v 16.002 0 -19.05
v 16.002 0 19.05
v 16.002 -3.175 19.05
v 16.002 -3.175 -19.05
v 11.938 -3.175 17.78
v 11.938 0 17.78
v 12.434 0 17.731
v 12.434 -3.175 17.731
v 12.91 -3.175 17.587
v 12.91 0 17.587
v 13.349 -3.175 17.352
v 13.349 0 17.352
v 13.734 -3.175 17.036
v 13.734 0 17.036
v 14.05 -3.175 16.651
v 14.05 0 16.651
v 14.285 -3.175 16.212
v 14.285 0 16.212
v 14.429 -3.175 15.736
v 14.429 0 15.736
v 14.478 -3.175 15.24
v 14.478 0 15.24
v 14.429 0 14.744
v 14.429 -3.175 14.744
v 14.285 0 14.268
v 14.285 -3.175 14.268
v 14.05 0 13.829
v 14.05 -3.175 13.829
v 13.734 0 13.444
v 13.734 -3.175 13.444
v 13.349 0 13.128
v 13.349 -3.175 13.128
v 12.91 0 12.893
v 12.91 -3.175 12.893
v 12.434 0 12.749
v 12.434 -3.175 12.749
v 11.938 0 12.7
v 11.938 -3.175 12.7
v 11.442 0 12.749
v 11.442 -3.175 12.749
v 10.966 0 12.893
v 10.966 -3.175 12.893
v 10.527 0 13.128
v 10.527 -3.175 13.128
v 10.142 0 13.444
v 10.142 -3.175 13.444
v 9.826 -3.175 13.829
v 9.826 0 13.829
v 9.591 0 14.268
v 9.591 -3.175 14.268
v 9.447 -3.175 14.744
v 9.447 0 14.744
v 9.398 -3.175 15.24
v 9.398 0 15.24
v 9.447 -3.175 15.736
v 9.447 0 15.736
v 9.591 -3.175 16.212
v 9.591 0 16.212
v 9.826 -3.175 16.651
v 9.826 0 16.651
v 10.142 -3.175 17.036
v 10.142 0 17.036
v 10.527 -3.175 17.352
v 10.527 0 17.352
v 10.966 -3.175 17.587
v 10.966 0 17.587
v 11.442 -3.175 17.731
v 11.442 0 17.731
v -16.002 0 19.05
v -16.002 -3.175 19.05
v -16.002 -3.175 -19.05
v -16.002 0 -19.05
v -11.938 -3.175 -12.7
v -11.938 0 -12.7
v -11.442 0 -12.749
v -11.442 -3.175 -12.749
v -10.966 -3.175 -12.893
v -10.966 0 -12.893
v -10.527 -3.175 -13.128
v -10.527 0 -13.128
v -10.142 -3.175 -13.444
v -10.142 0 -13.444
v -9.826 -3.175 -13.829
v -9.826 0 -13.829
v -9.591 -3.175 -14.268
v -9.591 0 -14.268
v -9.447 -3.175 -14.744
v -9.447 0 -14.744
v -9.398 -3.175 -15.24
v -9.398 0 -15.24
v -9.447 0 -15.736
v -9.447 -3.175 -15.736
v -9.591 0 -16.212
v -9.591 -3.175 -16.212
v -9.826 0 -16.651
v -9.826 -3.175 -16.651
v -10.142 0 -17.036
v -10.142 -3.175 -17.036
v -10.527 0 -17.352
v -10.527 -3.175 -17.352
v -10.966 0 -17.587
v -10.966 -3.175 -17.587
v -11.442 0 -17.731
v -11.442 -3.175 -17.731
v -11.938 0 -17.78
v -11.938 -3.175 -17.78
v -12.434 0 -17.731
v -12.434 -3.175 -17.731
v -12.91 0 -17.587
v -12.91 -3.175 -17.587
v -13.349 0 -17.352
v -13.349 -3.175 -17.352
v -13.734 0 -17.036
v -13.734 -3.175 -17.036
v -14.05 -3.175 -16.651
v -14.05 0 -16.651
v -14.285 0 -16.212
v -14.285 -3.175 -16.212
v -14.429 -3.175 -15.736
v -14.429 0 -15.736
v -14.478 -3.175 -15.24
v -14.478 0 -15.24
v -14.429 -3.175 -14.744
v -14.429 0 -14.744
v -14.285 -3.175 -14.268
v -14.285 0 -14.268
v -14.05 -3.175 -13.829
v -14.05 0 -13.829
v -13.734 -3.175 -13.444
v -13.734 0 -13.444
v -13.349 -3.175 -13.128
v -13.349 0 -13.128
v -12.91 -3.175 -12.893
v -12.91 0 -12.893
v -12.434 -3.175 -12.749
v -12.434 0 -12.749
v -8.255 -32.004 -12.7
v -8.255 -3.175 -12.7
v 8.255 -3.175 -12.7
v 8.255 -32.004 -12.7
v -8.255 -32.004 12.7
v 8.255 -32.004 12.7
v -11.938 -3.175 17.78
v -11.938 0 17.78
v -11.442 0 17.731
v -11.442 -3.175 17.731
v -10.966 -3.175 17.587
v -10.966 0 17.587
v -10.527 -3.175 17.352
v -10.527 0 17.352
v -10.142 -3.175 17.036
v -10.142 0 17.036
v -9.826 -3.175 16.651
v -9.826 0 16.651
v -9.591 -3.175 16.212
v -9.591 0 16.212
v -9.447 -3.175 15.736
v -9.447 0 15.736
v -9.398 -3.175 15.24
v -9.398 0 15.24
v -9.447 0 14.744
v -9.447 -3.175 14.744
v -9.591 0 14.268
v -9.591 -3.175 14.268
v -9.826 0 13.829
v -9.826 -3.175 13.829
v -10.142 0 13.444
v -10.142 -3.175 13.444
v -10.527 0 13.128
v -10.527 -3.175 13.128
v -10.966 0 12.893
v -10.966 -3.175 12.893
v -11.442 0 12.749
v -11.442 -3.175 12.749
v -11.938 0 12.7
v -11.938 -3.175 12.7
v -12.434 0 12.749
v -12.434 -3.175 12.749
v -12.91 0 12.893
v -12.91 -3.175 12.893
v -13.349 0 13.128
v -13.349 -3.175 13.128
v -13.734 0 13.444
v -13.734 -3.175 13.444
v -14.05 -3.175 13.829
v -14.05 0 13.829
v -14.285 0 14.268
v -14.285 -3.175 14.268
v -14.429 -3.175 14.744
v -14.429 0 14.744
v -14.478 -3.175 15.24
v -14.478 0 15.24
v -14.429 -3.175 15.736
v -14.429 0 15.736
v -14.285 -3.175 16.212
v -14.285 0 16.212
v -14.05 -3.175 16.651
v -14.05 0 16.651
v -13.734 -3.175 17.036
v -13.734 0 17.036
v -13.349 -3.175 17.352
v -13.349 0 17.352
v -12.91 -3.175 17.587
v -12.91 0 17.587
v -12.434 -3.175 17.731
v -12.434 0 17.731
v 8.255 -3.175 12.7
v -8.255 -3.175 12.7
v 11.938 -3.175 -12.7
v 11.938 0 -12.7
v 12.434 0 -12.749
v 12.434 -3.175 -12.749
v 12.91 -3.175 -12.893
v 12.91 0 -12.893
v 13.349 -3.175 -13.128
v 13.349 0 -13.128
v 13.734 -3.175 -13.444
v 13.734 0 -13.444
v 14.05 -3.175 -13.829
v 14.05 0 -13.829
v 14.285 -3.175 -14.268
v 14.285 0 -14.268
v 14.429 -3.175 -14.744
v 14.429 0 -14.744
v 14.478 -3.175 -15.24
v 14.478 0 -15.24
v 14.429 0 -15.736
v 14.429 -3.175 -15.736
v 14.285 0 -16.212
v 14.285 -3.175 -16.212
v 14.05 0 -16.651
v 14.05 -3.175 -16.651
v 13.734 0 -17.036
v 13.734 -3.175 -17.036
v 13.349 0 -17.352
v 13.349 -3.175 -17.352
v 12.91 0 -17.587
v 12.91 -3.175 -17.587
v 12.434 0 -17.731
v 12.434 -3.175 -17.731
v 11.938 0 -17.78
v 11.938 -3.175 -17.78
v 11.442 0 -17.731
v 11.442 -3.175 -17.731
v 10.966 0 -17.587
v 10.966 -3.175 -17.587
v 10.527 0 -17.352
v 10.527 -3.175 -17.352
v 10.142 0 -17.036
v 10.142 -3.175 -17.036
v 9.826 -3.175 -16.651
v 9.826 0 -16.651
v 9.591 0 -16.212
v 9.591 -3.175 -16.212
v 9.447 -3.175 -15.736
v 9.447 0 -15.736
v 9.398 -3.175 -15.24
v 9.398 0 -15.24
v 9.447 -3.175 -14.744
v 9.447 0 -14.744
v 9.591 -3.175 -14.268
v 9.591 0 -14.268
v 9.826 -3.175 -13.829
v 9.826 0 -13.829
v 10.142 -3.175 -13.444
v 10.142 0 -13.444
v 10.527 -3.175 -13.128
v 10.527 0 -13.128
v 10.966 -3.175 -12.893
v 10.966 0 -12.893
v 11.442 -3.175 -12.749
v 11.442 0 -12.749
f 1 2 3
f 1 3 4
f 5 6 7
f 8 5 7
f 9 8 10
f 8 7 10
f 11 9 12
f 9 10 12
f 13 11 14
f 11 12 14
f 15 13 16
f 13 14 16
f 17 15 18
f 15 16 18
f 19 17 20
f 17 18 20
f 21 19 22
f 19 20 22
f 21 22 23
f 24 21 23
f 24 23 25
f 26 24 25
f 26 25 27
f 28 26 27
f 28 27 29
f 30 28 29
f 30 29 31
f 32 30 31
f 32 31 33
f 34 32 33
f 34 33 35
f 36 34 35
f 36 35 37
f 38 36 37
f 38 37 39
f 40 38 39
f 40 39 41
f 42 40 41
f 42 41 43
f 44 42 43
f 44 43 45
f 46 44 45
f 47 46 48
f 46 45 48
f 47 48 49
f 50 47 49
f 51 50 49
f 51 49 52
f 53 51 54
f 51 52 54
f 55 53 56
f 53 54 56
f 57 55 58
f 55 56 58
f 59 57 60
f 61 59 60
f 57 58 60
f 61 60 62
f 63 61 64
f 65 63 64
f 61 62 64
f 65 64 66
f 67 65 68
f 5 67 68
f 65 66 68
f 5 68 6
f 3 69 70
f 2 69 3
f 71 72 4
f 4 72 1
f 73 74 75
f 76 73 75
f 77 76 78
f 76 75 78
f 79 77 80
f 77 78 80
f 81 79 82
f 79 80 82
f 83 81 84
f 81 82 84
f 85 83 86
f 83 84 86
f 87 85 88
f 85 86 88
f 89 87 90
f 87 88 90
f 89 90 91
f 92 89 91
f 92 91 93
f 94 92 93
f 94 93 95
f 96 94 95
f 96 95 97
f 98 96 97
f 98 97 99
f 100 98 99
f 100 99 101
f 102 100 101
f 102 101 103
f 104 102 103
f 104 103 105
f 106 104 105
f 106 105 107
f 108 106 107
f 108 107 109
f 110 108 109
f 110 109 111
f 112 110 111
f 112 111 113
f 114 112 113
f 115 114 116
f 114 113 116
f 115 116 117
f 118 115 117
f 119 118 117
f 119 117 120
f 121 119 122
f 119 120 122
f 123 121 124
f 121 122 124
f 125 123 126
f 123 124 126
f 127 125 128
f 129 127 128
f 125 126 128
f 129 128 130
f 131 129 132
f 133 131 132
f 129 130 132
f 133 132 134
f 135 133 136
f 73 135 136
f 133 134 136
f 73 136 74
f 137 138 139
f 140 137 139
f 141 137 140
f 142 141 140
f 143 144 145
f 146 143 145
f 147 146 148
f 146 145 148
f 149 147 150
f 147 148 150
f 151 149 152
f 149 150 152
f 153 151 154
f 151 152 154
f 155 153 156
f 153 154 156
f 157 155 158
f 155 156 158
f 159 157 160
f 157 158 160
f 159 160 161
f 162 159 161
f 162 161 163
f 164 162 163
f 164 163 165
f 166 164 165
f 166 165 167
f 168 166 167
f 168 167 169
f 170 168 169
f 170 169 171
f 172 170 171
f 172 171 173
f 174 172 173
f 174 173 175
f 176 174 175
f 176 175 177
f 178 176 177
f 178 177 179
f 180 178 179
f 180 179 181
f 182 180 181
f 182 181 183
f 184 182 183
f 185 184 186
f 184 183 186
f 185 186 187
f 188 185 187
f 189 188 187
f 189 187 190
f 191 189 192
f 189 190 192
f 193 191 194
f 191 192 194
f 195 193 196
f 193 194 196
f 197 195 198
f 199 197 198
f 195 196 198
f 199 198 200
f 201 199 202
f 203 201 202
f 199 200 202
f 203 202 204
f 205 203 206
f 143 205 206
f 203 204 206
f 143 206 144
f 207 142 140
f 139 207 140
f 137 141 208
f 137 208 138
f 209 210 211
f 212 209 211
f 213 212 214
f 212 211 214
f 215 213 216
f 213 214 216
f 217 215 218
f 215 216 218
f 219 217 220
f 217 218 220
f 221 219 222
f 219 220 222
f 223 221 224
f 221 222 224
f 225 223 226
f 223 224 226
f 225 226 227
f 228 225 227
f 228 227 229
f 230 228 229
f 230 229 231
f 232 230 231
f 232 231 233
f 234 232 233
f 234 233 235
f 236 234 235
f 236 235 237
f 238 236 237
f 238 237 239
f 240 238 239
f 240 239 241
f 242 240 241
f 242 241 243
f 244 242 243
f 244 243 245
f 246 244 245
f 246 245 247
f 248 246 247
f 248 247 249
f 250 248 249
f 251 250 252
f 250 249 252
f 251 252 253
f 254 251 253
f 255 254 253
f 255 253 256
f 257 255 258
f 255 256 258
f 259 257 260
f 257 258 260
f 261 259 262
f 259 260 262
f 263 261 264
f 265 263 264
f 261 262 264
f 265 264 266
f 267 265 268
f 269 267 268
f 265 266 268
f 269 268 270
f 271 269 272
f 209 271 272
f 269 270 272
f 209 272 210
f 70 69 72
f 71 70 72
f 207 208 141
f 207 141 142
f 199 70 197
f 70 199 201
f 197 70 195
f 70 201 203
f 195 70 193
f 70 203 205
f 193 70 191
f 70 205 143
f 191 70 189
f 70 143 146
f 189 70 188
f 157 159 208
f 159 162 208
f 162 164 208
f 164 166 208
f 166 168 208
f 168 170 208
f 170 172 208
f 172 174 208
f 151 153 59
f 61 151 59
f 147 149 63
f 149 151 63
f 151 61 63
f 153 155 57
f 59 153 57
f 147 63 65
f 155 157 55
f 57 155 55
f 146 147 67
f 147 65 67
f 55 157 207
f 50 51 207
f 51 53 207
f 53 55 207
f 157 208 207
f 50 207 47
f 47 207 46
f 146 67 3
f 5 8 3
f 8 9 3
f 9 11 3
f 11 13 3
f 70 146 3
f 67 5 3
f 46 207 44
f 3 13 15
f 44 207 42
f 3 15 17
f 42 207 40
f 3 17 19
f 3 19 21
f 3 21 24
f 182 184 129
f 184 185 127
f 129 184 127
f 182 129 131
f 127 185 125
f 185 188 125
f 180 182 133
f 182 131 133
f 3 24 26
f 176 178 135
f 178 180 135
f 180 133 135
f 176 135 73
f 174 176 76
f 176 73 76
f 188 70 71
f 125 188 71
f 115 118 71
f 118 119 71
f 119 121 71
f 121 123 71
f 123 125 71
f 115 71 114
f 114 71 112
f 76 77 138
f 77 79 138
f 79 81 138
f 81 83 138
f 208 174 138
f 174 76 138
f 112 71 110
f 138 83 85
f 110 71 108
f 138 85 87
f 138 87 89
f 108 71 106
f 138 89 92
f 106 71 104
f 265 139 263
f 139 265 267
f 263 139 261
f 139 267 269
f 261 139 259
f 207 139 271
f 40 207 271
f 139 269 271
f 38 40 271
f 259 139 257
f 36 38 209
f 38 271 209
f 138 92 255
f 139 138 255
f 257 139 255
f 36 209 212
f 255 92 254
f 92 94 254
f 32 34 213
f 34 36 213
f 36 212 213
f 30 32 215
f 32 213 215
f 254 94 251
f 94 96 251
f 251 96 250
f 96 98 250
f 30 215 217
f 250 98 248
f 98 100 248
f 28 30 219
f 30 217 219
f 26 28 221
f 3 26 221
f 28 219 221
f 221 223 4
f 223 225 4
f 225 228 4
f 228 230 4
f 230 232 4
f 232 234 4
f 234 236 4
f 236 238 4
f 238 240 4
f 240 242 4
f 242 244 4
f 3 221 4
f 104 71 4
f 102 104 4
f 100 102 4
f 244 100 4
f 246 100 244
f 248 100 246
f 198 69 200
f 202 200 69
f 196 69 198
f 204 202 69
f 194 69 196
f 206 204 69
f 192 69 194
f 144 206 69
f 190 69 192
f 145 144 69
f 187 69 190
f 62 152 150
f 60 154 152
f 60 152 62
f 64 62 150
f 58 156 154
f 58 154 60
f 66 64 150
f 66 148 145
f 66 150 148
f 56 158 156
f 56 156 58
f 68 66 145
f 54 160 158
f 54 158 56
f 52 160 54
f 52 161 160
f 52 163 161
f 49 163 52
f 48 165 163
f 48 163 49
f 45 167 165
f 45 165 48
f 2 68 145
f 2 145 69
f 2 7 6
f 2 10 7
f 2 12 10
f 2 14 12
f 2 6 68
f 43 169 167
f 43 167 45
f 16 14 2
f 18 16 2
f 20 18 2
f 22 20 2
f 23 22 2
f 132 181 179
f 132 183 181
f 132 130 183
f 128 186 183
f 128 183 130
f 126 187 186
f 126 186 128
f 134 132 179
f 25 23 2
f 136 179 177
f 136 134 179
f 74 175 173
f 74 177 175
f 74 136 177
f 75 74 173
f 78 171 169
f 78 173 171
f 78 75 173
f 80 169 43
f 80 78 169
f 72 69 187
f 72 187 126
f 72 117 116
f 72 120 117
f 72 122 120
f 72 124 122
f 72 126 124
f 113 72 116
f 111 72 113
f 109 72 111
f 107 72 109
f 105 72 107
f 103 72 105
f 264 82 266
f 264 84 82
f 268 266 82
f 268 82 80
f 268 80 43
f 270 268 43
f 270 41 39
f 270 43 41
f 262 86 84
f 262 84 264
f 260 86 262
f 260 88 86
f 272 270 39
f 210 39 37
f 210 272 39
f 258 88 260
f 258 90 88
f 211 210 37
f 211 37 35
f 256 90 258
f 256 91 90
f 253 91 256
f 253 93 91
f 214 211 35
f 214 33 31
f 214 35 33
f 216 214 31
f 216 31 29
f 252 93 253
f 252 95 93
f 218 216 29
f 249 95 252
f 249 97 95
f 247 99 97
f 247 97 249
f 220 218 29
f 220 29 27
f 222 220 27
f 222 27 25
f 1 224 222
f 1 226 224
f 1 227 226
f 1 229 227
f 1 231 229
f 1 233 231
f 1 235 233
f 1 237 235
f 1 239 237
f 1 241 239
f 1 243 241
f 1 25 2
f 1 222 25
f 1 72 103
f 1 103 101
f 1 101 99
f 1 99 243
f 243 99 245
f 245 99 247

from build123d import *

# Parameters (mm, degrees)
SKETCH3_W           = 32.004
SKETCH3_H           = 38.1
BOSS_EXTRUDE1_DEPTH = 3.175
SKETCH4_R           = 2.54
SCREW_HOLES_DEPTH   = 26.080811969
SKETCH5_W           = 16.51
SKETCH5_H           = 25.4
WHEEL_APPROX_DEPTH  = 32.004


with BuildPart() as part:
    # Sketch3 → Boss-Extrude1 (new body)
    with BuildSketch(Plane(origin=(0, 0, 0), x_dir=(1, 0, 0), z_dir=(0, 1, 0))):
        Rectangle(SKETCH3_W, SKETCH3_H)
    extrude(amount=-BOSS_EXTRUDE1_DEPTH)

    # Sketch4 → Screw Holes (cut, through all)
    with BuildSketch(Plane(origin=(0, 0, 0), x_dir=(1, 0, 0), z_dir=(0, 1, 0))):
        with Locations(Location((11.938, 15.24, 0), (0, 0, 270))):
            Circle(SKETCH4_R)
        with Locations(Location((-11.938, 15.24, 0), (0, 0, 270))):
            Circle(SKETCH4_R)
        with Locations(Location((-11.938, -15.24, 0), (0, 0, 270))):
            Circle(SKETCH4_R)
        with Locations(Location((11.938, -15.24, 0), (0, 0, 270))):
            Circle(SKETCH4_R)
    extrude(amount=-SCREW_HOLES_DEPTH, mode=Mode.SUBTRACT)

    # Sketch5 → Wheel Approx (add)
    with BuildSketch(Plane(origin=(0, 0, 0), x_dir=(1, 0, 0), z_dir=(0, 1, 0))):
        Rectangle(SKETCH5_W, SKETCH5_H)
    extrude(amount=-WHEEL_APPROX_DEPTH)


solid = part.part
